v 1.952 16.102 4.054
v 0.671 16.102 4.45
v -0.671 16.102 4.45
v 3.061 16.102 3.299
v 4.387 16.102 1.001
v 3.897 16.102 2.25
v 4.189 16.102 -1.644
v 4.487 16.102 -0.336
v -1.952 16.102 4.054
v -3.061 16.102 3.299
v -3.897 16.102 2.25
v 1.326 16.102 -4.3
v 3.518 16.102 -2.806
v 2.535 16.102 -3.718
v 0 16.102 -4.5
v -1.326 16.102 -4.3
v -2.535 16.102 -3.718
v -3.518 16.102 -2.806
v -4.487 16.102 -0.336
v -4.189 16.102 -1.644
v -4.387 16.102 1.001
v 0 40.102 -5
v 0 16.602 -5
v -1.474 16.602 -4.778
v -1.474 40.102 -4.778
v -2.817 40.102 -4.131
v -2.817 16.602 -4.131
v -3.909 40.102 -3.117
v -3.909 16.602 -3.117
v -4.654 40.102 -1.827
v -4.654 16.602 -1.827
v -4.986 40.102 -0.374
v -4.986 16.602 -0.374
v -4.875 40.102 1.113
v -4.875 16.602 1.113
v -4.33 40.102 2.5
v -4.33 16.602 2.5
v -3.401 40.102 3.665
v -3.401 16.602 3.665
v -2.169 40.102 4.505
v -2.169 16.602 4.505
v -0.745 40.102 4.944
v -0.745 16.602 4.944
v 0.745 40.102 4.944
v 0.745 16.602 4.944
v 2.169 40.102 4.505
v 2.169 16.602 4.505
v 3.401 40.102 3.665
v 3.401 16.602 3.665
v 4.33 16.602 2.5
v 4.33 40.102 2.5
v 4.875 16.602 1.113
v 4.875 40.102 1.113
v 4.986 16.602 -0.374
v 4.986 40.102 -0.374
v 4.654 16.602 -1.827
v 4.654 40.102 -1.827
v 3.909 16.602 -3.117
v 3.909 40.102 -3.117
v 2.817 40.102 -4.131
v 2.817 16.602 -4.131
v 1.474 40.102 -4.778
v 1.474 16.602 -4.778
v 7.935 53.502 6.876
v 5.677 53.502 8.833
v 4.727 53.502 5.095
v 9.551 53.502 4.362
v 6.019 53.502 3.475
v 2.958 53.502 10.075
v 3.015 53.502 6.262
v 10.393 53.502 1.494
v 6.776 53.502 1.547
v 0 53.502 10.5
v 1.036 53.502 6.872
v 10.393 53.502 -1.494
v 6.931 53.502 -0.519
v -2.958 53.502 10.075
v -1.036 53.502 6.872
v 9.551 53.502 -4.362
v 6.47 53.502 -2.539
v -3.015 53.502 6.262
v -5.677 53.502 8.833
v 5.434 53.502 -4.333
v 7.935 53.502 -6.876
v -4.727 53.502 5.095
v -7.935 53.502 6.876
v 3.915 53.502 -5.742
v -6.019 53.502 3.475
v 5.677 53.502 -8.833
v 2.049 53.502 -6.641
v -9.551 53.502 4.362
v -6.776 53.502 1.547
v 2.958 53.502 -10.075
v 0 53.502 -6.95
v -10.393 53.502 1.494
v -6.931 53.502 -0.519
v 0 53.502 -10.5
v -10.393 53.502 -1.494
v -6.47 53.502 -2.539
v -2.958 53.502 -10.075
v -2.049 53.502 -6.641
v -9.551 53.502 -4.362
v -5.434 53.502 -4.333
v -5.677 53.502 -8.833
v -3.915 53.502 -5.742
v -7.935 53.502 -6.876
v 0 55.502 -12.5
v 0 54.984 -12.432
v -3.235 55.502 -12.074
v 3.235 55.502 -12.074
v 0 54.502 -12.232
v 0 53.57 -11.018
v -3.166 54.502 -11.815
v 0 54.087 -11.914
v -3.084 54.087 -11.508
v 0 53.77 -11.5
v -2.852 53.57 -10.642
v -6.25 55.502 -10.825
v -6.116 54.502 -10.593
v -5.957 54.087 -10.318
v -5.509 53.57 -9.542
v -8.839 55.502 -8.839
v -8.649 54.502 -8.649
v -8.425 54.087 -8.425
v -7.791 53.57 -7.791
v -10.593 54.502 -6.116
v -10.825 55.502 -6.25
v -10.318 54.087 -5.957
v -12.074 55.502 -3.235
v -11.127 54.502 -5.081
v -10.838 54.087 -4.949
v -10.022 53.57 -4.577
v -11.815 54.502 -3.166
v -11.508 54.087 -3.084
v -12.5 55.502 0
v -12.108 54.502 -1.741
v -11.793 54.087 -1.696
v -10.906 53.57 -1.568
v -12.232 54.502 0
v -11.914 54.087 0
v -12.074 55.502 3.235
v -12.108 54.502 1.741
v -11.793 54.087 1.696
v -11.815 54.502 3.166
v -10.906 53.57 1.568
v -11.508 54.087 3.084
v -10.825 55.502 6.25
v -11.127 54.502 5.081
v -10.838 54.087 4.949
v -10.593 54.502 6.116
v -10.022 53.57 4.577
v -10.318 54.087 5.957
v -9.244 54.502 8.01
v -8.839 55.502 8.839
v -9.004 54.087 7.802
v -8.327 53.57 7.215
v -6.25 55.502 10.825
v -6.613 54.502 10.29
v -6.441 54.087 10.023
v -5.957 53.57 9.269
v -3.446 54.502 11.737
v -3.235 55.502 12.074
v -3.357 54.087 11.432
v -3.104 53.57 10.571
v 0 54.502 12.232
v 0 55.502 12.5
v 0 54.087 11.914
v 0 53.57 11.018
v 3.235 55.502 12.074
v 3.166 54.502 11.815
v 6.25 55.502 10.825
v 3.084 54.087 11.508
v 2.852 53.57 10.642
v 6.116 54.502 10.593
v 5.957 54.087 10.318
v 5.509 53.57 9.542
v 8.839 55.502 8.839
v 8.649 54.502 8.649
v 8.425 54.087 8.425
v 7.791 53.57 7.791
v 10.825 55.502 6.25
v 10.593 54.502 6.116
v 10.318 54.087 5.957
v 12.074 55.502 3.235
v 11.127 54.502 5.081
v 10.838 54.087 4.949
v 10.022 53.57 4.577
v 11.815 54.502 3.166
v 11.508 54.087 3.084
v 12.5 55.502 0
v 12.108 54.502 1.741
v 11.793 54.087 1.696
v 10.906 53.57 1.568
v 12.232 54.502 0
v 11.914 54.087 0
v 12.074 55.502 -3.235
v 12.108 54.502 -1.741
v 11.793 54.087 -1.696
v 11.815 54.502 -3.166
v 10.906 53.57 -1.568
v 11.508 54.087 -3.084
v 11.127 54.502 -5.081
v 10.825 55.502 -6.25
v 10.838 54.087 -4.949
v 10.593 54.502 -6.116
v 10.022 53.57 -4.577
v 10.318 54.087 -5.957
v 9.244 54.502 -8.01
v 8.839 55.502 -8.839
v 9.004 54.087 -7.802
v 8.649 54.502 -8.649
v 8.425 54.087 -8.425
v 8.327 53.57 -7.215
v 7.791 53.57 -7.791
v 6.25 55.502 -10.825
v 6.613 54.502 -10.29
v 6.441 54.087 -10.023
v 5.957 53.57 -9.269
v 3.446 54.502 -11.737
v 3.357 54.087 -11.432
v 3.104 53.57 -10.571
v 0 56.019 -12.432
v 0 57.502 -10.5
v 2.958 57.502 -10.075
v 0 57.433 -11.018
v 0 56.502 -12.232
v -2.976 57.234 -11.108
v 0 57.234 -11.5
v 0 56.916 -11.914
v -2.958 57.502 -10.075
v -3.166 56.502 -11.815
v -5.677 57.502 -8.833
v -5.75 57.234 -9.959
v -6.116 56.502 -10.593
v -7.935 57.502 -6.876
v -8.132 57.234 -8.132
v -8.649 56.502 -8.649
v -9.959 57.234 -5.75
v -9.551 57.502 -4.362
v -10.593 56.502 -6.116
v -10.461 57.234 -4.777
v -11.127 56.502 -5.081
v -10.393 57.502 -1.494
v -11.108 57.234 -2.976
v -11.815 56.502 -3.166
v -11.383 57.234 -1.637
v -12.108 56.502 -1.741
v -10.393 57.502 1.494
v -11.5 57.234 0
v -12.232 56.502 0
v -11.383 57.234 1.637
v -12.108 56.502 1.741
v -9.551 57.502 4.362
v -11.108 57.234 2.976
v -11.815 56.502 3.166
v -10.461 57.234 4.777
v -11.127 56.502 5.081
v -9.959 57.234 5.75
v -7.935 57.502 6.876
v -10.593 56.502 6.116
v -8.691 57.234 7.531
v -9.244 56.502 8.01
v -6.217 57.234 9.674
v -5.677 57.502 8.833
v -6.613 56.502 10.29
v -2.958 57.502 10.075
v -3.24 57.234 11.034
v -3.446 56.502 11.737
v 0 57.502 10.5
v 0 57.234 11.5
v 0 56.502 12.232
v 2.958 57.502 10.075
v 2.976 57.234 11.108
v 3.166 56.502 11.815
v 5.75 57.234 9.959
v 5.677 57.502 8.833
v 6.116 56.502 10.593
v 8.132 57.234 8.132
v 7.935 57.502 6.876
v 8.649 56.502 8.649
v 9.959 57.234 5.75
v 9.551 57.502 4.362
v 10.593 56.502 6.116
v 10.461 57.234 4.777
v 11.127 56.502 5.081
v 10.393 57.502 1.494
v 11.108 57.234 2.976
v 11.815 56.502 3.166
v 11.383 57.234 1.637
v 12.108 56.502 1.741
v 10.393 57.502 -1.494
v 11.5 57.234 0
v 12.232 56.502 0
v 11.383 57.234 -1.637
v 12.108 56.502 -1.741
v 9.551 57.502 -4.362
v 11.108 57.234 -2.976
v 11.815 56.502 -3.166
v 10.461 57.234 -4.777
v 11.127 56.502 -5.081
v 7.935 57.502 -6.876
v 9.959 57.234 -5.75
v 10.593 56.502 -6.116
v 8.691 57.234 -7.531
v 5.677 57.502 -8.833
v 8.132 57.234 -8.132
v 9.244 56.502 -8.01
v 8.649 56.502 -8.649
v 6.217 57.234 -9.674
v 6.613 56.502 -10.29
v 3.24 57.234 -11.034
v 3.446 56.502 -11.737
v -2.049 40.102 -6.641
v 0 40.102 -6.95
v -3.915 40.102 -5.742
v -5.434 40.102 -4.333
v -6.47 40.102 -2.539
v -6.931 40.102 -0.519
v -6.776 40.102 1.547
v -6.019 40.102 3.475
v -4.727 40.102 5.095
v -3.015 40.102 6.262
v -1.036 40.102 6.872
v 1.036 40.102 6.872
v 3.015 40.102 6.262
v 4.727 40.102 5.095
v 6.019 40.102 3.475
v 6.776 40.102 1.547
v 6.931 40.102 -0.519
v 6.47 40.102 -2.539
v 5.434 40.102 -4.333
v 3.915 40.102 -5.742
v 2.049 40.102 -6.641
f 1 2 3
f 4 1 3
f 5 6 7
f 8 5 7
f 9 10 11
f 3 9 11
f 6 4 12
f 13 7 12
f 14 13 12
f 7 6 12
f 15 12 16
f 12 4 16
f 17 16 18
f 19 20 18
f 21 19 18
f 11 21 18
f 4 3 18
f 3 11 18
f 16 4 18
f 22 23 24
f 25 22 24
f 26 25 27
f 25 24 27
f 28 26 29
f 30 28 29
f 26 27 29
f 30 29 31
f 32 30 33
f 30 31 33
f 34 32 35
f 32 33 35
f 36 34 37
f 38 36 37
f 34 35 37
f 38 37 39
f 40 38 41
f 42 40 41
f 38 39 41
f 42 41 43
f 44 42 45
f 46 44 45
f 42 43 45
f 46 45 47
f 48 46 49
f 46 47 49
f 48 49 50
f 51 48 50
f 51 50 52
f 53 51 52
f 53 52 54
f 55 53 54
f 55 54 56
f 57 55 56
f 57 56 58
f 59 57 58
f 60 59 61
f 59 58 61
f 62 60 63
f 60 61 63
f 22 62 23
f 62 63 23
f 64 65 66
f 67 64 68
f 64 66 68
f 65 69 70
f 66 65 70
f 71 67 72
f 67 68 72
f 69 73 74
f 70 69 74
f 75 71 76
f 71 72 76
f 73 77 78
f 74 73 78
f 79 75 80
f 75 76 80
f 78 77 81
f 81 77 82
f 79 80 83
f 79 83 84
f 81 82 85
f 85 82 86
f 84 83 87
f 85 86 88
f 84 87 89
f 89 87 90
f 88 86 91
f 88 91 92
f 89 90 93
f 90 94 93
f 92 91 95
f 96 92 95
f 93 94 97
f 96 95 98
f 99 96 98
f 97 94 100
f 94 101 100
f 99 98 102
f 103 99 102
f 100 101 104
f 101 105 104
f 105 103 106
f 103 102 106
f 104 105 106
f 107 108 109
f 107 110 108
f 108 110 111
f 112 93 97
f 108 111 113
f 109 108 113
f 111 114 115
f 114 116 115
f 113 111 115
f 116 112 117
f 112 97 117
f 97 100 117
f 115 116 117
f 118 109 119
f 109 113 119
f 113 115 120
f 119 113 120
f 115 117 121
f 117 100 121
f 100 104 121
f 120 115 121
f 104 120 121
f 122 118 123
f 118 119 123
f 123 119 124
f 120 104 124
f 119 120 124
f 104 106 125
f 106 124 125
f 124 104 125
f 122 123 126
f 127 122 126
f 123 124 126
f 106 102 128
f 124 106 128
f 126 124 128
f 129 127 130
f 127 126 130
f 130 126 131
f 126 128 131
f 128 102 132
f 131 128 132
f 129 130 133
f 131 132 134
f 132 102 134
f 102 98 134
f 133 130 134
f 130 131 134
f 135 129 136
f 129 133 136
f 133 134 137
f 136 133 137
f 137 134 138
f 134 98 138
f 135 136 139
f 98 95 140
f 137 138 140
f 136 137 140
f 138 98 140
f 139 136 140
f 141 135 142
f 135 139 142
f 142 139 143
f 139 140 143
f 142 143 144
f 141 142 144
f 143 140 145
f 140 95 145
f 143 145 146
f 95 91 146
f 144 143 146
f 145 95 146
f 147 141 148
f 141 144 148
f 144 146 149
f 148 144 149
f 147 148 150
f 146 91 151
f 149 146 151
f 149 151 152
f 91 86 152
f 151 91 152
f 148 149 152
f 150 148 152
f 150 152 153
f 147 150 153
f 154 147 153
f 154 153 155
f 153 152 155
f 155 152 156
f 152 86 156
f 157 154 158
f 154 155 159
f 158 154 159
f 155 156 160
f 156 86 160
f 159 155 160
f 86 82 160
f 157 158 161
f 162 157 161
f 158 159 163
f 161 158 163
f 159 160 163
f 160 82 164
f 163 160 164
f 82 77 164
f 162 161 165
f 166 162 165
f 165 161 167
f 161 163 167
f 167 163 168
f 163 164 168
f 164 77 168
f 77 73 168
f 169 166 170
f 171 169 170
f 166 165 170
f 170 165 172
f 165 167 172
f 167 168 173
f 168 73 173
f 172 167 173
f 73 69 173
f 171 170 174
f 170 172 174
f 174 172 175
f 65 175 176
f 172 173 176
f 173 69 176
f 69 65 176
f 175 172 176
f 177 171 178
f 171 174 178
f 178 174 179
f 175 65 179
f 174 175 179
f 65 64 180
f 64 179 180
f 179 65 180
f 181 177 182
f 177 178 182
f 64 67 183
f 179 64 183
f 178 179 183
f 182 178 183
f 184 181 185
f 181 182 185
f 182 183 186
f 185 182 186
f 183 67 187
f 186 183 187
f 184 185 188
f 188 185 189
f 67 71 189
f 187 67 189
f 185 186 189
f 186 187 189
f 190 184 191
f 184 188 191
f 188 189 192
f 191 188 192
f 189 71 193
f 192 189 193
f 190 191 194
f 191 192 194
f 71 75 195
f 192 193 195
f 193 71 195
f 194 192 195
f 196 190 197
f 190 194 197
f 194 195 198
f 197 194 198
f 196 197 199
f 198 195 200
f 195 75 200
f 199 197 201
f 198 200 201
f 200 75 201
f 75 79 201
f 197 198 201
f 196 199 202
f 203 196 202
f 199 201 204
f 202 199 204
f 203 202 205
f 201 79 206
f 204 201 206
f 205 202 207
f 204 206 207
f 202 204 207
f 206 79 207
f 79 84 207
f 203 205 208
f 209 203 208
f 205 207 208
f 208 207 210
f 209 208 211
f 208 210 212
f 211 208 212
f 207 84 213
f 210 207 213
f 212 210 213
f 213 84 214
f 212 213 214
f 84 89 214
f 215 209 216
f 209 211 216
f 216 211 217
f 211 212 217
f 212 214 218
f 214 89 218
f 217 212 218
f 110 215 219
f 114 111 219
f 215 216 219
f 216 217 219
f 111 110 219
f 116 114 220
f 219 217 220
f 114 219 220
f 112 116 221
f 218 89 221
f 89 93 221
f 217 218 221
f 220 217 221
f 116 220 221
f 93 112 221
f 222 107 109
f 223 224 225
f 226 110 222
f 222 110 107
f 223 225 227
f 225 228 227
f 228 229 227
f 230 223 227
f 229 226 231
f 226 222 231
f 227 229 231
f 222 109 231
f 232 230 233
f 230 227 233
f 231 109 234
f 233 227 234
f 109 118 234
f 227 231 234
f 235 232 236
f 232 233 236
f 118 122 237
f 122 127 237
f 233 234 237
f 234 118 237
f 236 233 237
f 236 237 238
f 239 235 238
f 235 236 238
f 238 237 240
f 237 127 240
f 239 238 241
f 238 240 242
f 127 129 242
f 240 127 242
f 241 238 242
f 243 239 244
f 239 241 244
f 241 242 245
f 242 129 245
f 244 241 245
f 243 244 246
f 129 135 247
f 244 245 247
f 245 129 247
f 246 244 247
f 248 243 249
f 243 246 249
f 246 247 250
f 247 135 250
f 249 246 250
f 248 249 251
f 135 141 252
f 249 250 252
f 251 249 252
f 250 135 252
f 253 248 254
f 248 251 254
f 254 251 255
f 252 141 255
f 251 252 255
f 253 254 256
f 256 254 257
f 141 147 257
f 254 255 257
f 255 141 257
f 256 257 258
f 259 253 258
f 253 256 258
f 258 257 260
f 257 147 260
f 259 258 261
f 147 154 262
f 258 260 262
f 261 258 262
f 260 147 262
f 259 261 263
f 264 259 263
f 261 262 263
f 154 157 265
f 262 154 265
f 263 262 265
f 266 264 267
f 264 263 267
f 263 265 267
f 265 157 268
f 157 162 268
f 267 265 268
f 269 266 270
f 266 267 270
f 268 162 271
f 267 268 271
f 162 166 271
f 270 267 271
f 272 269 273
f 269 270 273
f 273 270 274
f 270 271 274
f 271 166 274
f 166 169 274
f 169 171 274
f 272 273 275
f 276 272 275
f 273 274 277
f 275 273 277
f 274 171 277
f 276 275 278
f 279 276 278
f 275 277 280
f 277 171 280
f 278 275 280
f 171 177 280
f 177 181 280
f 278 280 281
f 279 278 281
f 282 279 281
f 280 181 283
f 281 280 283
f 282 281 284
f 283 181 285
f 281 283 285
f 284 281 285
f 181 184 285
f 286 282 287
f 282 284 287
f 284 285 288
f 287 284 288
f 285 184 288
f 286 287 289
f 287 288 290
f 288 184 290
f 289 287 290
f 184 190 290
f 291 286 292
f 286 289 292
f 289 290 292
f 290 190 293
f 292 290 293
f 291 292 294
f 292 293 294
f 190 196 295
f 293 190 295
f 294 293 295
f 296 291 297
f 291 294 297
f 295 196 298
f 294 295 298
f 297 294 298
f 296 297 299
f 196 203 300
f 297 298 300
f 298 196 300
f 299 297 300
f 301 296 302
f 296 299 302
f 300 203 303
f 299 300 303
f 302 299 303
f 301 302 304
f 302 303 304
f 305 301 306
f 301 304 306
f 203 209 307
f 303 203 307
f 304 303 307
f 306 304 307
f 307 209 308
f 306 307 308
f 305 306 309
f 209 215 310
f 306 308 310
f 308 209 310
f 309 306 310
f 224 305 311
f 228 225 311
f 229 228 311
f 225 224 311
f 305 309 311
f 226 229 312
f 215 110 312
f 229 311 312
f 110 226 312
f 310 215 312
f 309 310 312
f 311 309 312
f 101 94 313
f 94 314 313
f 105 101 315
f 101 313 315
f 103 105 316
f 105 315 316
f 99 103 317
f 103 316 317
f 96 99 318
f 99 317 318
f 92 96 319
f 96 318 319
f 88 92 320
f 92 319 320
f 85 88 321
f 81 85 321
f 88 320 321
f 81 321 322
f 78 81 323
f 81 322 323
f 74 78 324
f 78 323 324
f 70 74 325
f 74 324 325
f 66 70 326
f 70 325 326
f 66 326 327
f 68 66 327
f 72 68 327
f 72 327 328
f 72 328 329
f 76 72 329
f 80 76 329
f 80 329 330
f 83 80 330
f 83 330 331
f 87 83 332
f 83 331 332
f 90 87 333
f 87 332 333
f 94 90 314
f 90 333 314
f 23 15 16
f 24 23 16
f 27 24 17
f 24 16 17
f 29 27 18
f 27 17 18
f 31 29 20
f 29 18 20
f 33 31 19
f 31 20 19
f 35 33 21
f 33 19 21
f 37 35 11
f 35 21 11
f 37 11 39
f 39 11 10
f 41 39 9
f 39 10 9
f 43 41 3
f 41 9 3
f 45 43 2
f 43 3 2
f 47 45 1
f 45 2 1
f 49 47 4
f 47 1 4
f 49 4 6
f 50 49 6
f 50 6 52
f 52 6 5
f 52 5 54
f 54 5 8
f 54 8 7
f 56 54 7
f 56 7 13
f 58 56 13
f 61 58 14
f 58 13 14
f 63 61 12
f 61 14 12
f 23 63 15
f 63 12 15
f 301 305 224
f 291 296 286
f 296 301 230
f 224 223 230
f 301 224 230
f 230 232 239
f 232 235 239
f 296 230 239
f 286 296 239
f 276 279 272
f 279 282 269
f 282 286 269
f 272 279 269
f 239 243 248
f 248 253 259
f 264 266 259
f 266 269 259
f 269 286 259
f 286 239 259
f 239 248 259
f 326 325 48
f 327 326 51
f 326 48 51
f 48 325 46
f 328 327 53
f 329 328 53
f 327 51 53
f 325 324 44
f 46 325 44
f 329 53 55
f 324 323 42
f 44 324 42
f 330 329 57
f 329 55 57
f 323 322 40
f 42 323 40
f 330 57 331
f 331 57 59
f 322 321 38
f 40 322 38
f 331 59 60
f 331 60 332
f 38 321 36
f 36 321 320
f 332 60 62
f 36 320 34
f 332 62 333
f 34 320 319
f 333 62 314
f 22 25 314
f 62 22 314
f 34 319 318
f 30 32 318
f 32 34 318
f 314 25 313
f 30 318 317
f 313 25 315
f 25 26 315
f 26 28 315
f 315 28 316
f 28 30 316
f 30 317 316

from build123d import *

# Parameters (mm, degrees)
FILETE1_R     = 2
CHANFRO1_SIZE = 0.5


with BuildPart() as part:
    # Esboço1 → Revolução1 (revolve)
    with BuildSketch(Plane.XY, mode=Mode.PRIVATE) as revolu_o1_sk:
        Polygon((0, 57.501605759), (12.5, 57.501605759), (12.5, 53.501605759), (6.95, 53.501605759), (6.95, 40.101605759), (5, 40.101605759), (5, 16.101605759), (0, 16.101605759), align=None)
    revolve(revolu_o1_sk.sketch.rotate(Axis((0, -51.285215947, 0), (0, 1, 0)), 90), axis=Axis((0, -51.285215947, 0), (0, 1, 0)))

    # Filete1
    filete1_edges = [part.edges().sort_by_distance(p)[0] for p in [
        (0, 53.501605759, 12.5),
        (0, 57.501605759, 12.5),
    ]]
    fillet(filete1_edges, radius=FILETE1_R - 0.0001)  # a hair under: the kernel refuses the full size

    # Chanfro1
    chanfro1_edges = [part.edges().sort_by_distance(p)[0] for p in [
        (0, 16.101605759, 5),
    ]]
    chamfer(chanfro1_edges, length=CHANFRO1_SIZE)


solid = part.part
